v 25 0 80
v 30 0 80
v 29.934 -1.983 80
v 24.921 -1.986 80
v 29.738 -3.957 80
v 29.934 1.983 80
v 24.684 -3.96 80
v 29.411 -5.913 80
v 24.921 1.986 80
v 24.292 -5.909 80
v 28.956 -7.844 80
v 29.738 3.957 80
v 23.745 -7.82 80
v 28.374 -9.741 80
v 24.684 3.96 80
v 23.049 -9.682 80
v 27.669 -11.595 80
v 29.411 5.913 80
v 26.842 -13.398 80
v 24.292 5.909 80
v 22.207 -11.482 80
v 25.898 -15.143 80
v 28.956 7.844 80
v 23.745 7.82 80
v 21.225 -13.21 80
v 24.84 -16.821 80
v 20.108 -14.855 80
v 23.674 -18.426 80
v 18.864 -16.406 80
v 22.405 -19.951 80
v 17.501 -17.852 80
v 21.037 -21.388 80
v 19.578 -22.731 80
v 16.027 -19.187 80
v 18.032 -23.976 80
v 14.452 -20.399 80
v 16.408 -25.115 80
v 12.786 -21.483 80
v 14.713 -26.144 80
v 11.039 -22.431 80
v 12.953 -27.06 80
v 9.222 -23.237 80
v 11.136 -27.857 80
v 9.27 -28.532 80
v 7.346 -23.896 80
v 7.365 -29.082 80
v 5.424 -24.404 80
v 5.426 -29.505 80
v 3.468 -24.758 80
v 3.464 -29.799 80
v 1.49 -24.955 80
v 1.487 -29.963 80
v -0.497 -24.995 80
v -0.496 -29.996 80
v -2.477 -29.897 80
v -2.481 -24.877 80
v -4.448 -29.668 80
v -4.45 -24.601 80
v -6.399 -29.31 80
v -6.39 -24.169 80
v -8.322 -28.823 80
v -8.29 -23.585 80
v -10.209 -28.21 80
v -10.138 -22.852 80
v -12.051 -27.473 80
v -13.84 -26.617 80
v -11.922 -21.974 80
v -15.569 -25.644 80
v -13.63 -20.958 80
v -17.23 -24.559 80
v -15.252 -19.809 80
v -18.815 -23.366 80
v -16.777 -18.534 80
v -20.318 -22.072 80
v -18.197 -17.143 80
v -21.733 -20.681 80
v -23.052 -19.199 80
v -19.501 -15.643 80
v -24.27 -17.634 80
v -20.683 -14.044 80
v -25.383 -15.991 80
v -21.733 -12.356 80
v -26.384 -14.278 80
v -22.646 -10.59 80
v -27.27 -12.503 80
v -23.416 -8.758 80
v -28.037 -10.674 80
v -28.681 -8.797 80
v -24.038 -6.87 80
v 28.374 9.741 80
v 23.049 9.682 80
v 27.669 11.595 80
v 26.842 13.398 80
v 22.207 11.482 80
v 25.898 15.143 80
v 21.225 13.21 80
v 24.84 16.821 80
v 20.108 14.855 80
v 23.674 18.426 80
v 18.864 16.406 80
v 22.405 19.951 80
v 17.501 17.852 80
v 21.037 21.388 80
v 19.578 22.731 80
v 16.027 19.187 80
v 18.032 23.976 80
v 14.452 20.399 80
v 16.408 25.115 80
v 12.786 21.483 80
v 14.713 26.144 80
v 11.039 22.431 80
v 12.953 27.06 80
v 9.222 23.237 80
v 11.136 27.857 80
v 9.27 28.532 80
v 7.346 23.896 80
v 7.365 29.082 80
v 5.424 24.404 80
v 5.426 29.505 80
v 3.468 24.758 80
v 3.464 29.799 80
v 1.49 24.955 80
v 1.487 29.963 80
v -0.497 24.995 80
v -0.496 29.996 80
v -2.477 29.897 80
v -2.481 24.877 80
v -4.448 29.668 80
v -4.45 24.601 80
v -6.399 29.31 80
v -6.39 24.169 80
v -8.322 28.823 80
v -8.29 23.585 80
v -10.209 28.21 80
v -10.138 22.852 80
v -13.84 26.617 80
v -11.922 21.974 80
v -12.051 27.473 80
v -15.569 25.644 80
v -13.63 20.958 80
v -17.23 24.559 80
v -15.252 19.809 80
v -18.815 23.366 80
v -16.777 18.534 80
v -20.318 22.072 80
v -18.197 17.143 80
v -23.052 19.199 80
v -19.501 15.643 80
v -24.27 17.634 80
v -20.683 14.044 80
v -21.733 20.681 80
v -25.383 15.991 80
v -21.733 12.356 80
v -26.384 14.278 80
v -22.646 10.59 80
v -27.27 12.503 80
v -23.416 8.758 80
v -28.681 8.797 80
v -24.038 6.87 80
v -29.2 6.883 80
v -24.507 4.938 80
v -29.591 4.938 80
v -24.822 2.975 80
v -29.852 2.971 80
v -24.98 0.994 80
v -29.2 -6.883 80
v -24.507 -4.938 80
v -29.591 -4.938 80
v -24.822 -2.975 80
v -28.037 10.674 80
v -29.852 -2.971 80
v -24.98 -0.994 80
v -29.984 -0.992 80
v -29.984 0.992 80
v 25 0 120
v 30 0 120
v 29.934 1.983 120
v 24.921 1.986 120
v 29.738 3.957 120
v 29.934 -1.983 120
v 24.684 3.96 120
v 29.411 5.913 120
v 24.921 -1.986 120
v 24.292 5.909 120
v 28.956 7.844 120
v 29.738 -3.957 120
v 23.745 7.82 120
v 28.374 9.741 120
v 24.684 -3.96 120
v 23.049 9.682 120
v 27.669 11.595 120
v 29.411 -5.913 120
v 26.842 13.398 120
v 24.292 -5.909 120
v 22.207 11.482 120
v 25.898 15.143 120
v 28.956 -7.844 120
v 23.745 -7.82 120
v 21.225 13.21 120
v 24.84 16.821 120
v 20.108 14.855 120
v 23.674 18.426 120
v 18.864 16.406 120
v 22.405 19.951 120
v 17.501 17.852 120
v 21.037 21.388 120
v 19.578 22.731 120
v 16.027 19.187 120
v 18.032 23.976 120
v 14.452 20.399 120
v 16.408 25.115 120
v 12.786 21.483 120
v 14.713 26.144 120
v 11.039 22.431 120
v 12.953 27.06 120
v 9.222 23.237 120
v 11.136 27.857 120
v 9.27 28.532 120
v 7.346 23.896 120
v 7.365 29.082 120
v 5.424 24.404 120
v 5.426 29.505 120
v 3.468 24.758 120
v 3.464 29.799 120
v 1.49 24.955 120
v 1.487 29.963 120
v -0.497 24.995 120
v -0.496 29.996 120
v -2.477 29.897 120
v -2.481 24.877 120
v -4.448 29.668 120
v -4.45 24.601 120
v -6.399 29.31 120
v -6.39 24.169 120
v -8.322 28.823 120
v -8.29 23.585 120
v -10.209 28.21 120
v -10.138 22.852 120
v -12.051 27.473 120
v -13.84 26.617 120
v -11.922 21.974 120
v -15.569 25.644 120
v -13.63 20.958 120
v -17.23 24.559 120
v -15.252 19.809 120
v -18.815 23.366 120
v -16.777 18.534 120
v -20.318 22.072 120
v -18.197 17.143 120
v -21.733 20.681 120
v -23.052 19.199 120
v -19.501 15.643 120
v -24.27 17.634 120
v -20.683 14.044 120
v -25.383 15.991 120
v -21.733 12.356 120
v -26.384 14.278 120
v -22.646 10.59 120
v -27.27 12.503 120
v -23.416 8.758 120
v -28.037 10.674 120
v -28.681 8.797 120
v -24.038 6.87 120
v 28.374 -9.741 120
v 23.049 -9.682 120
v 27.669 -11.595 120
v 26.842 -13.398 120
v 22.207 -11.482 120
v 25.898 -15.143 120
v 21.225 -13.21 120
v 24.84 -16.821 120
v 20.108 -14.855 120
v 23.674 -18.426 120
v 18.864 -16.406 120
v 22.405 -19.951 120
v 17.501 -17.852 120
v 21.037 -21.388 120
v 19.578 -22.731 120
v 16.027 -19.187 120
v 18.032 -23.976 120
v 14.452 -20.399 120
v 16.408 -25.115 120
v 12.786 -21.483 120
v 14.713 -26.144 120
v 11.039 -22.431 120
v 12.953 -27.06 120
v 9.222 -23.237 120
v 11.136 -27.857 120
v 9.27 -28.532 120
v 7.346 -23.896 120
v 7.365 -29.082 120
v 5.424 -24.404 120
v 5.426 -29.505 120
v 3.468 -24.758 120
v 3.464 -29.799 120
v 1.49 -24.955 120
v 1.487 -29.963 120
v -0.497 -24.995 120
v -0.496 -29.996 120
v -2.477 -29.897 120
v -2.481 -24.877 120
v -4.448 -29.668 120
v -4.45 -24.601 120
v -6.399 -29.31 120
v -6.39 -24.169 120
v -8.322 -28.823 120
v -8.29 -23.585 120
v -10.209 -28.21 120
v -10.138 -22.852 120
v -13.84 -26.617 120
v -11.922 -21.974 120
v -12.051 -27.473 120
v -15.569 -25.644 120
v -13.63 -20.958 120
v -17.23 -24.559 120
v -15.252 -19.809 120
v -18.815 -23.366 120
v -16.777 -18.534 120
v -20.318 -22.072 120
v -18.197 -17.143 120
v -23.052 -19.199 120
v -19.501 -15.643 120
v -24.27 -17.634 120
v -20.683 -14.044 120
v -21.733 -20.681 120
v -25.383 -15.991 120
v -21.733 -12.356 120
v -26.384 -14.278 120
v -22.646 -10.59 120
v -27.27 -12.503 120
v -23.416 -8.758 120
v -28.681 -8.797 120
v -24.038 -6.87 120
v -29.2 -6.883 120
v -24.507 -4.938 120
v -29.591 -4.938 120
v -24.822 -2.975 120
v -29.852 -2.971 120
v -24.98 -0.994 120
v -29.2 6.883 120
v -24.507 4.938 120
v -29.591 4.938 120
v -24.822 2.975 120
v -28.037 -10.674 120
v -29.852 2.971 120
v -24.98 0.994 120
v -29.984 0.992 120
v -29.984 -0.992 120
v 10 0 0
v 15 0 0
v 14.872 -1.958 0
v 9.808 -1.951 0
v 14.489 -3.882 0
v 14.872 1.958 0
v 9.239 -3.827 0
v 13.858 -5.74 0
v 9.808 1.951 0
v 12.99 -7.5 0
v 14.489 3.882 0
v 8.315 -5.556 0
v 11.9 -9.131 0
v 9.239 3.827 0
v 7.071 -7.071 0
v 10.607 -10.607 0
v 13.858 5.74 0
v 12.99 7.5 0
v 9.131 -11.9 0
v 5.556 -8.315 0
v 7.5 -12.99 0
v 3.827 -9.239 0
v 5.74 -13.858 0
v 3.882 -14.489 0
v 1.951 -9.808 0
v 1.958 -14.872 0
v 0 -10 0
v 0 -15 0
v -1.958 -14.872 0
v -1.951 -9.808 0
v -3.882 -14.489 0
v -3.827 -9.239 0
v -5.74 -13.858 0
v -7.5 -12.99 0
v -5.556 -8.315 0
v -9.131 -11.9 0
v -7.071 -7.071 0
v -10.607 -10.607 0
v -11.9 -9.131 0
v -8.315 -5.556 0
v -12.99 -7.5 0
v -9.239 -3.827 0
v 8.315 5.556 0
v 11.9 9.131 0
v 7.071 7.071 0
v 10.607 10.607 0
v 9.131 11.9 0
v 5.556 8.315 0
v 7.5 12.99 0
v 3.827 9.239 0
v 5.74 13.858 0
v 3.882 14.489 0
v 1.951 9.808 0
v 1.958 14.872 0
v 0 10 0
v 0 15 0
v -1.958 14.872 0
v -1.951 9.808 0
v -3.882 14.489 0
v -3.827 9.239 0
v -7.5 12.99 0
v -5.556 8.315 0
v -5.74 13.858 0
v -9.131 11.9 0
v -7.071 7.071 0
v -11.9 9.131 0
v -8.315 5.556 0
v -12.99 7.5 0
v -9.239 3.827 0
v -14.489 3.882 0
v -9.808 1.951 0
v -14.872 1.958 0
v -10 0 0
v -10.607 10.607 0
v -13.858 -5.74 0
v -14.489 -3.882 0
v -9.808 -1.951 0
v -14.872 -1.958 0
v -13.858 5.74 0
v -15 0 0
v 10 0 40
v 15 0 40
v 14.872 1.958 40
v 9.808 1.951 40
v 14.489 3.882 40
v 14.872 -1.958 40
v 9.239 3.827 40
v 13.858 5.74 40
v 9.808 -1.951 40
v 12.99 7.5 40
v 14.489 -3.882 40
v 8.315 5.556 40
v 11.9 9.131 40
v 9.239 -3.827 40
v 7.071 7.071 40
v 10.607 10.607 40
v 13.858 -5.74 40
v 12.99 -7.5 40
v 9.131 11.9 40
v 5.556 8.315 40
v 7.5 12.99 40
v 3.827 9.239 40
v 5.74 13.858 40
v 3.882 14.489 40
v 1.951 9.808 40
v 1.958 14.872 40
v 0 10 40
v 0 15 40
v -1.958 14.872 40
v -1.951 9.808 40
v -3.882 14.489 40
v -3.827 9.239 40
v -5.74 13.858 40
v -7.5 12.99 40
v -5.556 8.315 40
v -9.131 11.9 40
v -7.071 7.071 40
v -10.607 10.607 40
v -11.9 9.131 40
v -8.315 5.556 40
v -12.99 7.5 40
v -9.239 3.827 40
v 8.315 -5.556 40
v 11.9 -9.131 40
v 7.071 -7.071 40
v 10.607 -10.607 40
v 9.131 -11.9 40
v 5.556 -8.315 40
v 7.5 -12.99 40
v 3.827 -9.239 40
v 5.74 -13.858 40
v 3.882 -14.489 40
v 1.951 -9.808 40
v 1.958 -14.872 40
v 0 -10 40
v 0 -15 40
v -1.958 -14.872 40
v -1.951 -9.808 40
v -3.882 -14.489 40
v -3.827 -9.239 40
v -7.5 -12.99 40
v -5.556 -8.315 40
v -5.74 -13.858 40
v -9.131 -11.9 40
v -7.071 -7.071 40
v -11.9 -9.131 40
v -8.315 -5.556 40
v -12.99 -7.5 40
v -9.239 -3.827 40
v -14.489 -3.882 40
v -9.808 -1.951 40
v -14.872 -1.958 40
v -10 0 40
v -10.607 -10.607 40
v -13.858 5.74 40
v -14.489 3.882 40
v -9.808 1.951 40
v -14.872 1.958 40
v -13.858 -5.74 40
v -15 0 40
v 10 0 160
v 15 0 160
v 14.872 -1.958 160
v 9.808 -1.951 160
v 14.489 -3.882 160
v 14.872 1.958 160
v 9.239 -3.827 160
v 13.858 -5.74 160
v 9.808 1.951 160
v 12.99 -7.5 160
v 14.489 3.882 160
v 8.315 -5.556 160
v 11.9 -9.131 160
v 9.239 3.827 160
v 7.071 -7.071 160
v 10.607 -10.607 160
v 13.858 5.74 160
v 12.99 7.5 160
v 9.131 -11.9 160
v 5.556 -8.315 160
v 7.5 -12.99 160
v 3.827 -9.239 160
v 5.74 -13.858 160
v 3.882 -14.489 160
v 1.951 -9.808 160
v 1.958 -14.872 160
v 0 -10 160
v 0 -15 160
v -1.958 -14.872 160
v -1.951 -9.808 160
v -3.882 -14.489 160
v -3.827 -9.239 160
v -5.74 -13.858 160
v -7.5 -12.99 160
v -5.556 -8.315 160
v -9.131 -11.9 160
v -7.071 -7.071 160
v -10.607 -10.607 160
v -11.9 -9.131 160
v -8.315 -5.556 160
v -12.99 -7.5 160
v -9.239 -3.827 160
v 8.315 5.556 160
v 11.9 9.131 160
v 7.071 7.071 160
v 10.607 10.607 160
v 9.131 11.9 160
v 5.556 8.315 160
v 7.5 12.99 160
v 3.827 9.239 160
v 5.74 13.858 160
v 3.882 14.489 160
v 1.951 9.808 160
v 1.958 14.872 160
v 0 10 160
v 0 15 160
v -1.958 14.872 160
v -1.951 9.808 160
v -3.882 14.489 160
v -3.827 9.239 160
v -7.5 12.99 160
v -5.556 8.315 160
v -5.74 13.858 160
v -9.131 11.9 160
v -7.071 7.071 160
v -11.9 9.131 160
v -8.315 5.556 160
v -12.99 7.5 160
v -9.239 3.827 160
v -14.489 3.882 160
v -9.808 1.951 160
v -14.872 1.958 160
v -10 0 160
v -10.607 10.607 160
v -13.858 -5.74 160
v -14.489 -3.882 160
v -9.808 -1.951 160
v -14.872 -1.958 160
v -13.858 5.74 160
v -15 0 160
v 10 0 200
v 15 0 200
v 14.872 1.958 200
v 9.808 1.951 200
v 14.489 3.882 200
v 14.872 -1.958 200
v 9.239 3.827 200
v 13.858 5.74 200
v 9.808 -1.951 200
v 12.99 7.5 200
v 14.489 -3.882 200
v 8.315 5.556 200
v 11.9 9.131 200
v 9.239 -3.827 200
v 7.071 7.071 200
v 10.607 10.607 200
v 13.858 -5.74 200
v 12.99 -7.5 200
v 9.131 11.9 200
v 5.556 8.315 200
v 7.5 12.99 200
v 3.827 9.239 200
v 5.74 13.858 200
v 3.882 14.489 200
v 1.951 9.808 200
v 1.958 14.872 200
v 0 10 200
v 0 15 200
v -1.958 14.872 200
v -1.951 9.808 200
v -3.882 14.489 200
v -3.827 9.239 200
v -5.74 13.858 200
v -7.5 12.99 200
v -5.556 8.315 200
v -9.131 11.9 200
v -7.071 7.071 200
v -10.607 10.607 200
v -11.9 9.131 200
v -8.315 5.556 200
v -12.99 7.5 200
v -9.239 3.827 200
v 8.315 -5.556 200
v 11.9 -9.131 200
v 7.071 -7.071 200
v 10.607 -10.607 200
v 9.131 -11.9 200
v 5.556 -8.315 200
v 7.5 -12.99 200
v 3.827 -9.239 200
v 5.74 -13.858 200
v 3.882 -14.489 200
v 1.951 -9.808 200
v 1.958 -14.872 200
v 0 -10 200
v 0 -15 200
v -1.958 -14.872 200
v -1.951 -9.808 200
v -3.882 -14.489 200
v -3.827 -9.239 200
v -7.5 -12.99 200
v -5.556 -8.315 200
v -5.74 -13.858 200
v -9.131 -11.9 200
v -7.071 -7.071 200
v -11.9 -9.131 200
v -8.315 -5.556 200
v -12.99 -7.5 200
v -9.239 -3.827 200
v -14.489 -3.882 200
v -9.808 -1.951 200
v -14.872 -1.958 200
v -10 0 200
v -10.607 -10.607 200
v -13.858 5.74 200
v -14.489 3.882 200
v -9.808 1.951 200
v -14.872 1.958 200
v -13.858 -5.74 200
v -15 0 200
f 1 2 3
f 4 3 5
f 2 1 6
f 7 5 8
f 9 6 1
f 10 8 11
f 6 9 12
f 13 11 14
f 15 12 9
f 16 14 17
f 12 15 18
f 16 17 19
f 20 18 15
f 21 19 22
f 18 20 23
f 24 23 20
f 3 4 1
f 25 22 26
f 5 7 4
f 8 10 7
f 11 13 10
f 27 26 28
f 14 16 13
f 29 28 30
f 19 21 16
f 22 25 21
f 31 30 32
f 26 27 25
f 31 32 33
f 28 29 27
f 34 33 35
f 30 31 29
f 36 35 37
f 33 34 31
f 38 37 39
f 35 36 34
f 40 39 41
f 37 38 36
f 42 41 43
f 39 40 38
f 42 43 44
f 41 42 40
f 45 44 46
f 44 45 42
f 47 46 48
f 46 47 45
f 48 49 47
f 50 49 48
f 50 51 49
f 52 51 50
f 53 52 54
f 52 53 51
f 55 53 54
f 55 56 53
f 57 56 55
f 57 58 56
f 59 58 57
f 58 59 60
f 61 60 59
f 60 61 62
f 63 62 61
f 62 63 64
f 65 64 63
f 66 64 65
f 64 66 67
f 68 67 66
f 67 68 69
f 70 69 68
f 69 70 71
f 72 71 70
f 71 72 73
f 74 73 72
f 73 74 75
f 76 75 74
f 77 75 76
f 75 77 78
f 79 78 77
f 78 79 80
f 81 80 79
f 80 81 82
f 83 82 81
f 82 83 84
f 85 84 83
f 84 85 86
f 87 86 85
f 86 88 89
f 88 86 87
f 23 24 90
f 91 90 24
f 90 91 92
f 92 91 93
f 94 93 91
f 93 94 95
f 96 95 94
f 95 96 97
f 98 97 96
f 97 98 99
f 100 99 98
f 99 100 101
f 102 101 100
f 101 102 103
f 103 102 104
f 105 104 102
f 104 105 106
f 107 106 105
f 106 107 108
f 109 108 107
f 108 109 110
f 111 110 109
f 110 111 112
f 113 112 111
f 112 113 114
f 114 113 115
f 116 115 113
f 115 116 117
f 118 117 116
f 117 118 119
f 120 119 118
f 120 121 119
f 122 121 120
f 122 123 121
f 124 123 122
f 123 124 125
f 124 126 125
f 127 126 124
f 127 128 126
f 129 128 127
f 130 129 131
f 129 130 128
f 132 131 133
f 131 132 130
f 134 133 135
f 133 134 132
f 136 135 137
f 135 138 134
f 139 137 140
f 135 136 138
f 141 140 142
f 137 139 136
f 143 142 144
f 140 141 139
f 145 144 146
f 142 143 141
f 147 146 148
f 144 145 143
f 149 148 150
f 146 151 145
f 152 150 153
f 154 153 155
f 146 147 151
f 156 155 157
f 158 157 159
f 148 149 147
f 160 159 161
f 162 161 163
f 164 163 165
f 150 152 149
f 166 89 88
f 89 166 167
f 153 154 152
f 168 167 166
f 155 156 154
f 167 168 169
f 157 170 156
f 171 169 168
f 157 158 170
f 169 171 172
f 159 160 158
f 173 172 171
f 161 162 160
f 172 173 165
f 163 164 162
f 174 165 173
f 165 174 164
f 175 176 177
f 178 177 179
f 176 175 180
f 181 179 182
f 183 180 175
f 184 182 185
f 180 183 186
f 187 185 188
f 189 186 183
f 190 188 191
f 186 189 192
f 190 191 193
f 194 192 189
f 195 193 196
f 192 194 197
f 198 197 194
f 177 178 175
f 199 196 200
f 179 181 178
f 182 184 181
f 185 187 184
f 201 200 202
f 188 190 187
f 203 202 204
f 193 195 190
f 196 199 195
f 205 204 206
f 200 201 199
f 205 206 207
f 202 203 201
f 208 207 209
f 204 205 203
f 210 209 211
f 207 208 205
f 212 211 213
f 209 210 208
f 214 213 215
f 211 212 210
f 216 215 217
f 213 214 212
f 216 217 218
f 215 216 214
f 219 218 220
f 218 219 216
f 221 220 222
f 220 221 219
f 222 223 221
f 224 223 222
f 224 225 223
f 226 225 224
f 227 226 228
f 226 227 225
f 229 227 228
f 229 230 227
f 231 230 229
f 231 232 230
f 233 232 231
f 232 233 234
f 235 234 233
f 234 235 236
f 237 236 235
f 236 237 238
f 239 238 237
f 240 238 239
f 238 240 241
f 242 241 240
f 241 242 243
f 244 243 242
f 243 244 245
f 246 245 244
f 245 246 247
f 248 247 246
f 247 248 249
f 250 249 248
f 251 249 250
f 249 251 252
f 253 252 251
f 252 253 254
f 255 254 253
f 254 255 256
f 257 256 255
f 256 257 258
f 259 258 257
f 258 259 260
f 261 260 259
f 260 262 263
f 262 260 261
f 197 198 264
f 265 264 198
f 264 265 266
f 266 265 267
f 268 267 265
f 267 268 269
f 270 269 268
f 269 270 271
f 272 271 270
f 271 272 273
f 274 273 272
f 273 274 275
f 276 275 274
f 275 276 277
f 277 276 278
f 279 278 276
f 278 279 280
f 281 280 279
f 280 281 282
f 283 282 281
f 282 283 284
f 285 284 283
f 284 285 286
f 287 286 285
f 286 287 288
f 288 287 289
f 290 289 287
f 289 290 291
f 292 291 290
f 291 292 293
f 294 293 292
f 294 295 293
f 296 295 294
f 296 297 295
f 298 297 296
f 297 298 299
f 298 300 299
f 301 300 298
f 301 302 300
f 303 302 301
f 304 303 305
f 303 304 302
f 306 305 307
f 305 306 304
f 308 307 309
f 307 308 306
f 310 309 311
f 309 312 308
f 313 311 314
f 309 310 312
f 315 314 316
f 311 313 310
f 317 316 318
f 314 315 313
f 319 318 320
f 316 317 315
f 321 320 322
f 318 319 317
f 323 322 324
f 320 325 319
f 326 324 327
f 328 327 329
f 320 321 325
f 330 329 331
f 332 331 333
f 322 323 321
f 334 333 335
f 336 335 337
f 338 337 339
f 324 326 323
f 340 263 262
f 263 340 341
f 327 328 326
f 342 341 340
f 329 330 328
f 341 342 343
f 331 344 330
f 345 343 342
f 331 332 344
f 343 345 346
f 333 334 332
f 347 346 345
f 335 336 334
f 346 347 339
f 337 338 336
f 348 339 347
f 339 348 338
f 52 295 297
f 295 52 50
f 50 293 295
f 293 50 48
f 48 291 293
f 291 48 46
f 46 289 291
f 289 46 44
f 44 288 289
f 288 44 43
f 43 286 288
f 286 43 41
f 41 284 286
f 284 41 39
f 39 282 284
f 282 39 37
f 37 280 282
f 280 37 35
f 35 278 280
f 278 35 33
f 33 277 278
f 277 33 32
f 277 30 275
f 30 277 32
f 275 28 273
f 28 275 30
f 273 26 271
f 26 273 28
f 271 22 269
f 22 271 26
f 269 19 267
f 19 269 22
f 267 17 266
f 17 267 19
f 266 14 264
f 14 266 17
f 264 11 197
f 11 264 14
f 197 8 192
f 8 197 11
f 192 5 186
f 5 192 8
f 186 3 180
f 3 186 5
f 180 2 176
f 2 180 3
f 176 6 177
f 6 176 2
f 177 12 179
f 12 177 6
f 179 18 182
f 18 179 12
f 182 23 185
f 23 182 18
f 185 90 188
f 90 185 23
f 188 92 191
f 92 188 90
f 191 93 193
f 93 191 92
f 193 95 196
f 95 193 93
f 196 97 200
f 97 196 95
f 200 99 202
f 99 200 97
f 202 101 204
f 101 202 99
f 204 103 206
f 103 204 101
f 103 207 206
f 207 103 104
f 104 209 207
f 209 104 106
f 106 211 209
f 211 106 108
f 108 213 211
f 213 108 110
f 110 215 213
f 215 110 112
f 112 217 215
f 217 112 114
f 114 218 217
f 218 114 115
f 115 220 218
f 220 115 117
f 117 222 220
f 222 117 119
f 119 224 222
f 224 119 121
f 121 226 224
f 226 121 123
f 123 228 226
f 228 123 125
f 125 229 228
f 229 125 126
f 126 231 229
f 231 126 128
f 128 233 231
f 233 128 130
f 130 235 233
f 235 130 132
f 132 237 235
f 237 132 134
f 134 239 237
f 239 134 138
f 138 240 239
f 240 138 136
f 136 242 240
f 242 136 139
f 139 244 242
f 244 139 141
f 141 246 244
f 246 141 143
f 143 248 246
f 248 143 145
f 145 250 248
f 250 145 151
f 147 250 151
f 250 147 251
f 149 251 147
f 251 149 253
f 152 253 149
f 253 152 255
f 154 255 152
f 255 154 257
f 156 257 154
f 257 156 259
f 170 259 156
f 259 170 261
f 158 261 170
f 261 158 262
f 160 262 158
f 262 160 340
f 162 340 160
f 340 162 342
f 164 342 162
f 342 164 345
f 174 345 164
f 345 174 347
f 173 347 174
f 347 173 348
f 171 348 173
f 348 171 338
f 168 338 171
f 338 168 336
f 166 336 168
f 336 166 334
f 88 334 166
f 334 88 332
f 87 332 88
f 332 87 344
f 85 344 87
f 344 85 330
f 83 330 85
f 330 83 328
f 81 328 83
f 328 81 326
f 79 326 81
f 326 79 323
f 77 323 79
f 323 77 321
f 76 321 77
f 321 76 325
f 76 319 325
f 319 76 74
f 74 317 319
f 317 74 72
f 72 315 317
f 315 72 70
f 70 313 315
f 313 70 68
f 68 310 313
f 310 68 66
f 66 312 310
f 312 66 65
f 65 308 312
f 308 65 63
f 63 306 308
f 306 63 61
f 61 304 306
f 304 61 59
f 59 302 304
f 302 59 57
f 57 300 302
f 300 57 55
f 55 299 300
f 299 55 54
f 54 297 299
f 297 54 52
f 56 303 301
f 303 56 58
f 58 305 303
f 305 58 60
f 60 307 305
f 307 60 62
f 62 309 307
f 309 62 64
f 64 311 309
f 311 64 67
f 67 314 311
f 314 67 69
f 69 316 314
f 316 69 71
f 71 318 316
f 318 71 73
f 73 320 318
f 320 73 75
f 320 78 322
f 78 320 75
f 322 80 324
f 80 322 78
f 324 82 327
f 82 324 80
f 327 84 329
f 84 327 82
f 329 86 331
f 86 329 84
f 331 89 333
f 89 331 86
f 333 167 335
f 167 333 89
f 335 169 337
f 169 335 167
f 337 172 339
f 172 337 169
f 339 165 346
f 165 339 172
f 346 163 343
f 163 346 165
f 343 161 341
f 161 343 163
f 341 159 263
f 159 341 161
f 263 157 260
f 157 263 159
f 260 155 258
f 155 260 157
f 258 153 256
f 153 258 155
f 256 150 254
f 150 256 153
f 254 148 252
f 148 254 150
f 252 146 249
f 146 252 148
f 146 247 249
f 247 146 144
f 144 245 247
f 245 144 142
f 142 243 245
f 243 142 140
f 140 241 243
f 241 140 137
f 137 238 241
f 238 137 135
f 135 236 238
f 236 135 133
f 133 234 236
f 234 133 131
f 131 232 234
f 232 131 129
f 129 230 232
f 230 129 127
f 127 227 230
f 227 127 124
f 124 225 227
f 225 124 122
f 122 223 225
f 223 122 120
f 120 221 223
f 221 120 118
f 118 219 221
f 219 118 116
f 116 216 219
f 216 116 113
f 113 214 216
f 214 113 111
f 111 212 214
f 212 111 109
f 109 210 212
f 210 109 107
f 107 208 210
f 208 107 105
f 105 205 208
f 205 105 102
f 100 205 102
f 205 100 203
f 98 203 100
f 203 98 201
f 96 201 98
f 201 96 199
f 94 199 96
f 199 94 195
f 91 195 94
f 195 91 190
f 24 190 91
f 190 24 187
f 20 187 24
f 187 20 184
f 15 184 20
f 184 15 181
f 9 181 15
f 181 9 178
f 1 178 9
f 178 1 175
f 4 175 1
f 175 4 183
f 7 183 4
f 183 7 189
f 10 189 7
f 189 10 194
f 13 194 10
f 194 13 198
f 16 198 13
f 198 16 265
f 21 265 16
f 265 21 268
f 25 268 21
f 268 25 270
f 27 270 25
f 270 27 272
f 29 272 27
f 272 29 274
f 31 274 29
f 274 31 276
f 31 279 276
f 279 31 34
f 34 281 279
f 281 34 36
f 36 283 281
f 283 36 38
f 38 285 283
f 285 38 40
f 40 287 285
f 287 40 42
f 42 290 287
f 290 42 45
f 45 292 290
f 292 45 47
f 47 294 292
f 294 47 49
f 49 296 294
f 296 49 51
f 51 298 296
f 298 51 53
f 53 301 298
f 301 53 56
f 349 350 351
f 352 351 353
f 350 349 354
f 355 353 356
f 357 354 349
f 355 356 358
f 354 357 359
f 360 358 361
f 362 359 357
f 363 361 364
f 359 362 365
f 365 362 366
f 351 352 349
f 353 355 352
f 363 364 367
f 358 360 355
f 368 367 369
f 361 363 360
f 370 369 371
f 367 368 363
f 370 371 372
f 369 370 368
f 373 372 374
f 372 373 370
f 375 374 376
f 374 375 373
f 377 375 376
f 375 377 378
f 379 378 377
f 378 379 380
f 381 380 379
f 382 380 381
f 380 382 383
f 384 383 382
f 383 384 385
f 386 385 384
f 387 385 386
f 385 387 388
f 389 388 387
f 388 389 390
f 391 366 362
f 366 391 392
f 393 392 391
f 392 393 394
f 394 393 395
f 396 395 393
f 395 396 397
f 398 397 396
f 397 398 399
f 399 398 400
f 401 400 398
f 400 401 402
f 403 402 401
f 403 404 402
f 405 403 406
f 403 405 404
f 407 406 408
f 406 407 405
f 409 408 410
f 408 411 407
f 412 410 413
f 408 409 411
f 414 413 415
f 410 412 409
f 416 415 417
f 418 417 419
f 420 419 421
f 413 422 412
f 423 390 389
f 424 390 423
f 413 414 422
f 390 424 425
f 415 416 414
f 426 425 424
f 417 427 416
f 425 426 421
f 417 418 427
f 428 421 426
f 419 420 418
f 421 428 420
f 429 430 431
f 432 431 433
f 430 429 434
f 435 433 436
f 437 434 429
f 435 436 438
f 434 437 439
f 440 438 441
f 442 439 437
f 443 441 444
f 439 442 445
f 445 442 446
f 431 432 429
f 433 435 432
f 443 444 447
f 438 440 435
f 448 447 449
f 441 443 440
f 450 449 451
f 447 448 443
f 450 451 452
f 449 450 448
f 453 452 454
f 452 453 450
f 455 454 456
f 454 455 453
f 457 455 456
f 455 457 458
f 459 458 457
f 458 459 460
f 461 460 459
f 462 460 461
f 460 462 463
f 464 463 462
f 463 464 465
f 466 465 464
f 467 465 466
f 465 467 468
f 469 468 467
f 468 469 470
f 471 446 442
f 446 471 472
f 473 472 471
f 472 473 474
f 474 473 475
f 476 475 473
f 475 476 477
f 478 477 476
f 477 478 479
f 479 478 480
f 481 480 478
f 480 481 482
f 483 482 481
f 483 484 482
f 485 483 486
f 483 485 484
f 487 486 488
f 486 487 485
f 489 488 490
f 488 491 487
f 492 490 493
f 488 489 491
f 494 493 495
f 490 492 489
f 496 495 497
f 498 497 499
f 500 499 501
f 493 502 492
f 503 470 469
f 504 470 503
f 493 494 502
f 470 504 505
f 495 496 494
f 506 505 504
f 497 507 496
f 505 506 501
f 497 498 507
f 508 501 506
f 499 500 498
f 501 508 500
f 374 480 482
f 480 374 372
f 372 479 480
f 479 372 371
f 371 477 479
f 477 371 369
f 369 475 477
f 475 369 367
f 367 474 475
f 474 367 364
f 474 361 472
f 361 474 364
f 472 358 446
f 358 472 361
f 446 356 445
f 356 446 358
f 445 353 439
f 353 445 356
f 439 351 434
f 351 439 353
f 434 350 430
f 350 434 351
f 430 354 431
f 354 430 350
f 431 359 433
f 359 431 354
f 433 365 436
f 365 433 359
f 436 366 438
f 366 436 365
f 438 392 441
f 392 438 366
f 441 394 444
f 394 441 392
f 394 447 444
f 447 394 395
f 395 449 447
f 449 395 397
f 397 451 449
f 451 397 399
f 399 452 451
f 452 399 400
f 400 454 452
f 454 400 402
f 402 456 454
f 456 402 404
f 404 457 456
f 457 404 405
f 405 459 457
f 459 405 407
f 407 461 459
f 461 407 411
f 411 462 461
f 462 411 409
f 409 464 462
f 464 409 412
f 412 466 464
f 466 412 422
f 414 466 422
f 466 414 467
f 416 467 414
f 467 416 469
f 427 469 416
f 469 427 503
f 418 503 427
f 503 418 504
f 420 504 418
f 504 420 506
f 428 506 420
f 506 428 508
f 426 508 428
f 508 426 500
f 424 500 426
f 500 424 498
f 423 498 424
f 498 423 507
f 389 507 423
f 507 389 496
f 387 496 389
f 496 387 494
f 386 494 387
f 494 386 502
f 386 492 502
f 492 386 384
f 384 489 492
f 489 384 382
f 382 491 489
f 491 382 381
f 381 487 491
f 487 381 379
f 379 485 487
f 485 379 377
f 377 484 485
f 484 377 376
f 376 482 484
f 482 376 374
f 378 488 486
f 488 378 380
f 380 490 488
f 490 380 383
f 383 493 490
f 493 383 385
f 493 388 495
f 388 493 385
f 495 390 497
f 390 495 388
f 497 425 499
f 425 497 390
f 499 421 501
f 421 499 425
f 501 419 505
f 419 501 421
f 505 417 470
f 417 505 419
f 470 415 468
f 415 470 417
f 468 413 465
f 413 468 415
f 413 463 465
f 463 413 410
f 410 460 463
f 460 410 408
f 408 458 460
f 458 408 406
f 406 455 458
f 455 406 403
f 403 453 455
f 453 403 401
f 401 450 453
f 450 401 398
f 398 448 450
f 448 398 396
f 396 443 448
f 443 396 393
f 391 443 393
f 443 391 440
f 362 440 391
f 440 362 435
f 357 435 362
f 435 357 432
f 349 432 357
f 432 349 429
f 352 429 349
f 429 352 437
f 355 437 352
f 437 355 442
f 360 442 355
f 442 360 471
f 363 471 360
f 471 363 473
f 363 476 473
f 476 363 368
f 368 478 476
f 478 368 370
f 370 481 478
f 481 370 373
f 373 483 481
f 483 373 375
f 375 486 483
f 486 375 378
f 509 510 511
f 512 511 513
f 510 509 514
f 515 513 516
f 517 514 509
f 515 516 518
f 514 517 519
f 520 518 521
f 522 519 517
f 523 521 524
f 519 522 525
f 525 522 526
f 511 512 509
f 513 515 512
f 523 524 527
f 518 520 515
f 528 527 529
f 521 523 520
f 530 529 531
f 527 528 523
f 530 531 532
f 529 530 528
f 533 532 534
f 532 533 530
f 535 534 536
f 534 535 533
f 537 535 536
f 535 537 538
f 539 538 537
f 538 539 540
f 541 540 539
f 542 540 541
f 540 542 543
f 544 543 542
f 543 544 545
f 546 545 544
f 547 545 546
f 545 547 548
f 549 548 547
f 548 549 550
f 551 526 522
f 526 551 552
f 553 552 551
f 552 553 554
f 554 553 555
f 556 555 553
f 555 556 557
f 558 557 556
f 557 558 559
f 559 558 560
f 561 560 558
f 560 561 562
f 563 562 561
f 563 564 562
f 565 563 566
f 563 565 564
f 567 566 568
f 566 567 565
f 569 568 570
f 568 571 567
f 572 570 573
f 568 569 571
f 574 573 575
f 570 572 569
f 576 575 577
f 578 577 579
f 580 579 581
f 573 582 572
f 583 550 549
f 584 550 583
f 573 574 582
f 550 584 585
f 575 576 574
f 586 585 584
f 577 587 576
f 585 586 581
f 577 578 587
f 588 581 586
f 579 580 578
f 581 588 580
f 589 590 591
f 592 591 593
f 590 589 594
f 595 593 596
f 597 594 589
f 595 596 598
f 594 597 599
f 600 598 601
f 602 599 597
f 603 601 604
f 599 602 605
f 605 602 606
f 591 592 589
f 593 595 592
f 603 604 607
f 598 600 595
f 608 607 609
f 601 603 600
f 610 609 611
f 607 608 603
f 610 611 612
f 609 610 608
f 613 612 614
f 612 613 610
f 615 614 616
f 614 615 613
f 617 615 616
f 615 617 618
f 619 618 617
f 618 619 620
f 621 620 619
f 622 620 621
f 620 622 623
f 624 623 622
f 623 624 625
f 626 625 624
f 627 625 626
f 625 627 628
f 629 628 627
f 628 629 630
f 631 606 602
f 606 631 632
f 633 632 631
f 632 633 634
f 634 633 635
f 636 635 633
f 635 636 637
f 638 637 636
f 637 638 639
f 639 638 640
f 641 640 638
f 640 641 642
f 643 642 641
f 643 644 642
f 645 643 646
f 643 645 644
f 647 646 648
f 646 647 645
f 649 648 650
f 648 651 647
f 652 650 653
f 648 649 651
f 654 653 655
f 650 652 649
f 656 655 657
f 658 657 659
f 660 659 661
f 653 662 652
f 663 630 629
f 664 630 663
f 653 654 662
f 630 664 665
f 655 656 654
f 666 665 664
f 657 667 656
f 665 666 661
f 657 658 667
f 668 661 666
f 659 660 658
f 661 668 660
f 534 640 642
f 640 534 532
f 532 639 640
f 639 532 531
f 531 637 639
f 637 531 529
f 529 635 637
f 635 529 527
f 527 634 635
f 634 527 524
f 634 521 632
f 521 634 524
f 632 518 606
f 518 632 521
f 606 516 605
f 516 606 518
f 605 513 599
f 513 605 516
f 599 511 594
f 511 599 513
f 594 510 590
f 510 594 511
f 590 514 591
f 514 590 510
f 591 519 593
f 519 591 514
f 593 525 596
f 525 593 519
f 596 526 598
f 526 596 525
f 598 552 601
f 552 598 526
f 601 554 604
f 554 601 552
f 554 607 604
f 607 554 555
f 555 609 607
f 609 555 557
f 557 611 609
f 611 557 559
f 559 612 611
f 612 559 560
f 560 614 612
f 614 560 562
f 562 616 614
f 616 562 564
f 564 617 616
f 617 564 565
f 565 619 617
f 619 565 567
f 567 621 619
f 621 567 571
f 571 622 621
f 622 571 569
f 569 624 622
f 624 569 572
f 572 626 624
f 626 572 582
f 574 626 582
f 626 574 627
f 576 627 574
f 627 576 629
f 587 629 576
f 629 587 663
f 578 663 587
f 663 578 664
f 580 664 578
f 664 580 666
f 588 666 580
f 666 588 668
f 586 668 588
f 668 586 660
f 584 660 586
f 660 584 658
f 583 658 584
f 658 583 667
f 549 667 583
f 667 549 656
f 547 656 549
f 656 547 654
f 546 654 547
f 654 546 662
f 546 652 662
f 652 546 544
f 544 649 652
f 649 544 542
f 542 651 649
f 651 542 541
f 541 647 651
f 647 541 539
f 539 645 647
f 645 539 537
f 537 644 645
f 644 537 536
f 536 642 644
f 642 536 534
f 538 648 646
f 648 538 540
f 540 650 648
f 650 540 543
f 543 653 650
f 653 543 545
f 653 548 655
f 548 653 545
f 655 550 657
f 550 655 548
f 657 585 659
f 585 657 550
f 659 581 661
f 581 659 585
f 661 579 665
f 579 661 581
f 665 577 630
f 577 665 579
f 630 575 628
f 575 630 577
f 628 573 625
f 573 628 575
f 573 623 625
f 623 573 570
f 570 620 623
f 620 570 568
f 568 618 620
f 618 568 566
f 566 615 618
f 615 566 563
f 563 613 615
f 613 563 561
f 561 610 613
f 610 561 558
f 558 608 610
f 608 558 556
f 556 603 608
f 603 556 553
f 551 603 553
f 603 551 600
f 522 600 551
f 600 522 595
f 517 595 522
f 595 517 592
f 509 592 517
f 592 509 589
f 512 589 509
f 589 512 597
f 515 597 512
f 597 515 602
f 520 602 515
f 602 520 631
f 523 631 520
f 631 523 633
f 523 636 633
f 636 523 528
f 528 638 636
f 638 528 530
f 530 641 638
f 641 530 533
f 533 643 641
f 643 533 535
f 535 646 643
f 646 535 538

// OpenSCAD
// Generated by Parametrix
ca_myPartU_faceSide_000 = [ [ 30.0000, 80.0000 ],[ 30.0000, 120.0000 ],[ 25.0000, 120.0000 ],[ 25.0000, 80.0000 ],[ 30.0000, 80.0000 ] ];
cb_myPartU_faceSide_000 = [  0, 1, 2, 3, 4 ];
ca_myPartU_faceSide_001 = [ [ 15.0000, 0.0000 ],[ 15.0000, 40.0000 ],[ 10.0000, 40.0000 ],[ 10.0000, 0.0000 ],[ 15.0000, 0.0000 ] ];
cb_myPartU_faceSide_001 = [  5, 6, 7, 8, 9 ];
ca_myPartU_faceSide_002 = [ [ 15.0000, 160.0000 ],[ 15.0000, 200.0000 ],[ 10.0000, 200.0000 ],[ 10.0000, 160.0000 ],[ 15.0000, 160.0000 ] ];
cb_myPartU_faceSide_002 = [  10, 11, 12, 13, 14 ];
a_myPartU_faceSide = concat(ca_myPartU_faceSide_000, ca_myPartU_faceSide_001, ca_myPartU_faceSide_002);
b_myPartU_faceSide = [cb_myPartU_faceSide_000, cb_myPartU_faceSide_001, cb_myPartU_faceSide_002];
ca_myPartU_faceSection_000 = [ [ 30.0000, 0.0000 ],[ 29.9344, 1.9827 ],[ 29.7379, 3.9568 ],[ 29.4114, 5.9135 ],[ 28.9563, 7.8444 ],[ 28.3745, 9.7410 ],[ 27.6687, 11.5950 ],[ 26.8419, 13.3983 ],[ 25.8977, 15.1430 ],[ 24.8403, 16.8215 ],[ 23.6742, 18.4264 ],[ 22.4046, 19.9507 ],[ 21.0371, 21.3879 ],[ 19.5776, 22.7314 ],[ 18.0324, 23.9756 ],[ 16.4084, 25.1150 ],[ 14.7127, 26.1445 ],[ 12.9526, 27.0597 ],[ 11.1359, 27.8566 ],[ 9.2705, 28.5317 ],[ 7.3646, 29.0820 ],[ 5.4264, 29.5052 ],[ 3.4645, 29.7993 ],[ 1.4875, 29.9631 ],[ -0.4960, 29.9959 ],[ -2.4774, 29.8975 ],[ -4.4479, 29.6684 ],[ -6.3990, 29.3096 ],[ -8.3221, 28.8226 ],[ -10.2088, 28.2096 ],[ -12.0509, 27.4732 ],[ -13.8402, 26.6167 ],[ -15.5691, 25.6438 ],[ -17.2299, 24.5587 ],[ -18.8153, 23.3663 ],[ -20.3184, 22.0717 ],[ -21.7328, 20.6806 ],[ -23.0520, 19.1991 ],[ -24.2705, 17.6336 ],[ -25.3829, 15.9910 ],[ -26.3842, 14.2784 ],[ -27.2702, 12.5035 ],[ -28.0369, 10.6738 ],[ -28.6811, 8.7975 ],[ -29.1998, 6.8827 ],[ -29.5908, 4.9378 ],[ -29.8525, 2.9714 ],[ -29.9836, 0.9919 ],[ -29.9836, -0.9919 ],[ -29.8525, -2.9714 ],[ -29.5908, -4.9378 ],[ -29.1998, -6.8827 ],[ -28.6811, -8.7975 ],[ -28.0369, -10.6738 ],[ -27.2702, -12.5035 ],[ -26.3842, -14.2784 ],[ -25.3829, -15.9910 ],[ -24.2705, -17.6336 ],[ -23.0520, -19.1991 ],[ -21.7328, -20.6806 ],[ -20.3184, -22.0717 ],[ -18.8153, -23.3663 ],[ -17.2299, -24.5587 ],[ -15.5691, -25.6438 ],[ -13.8402, -26.6167 ],[ -12.0509, -27.4732 ],[ -10.2088, -28.2096 ],[ -8.3221, -28.8226 ],[ -6.3990, -29.3096 ],[ -4.4479, -29.6684 ],[ -2.4774, -29.8975 ],[ -0.4960, -29.9959 ],[ 1.4875, -29.9631 ],[ 3.4645, -29.7993 ],[ 5.4264, -29.5052 ],[ 7.3646, -29.0820 ],[ 9.2705, -28.5317 ],[ 11.1359, -27.8566 ],[ 12.9526, -27.0597 ],[ 14.7127, -26.1445 ],[ 16.4084, -25.1150 ],[ 18.0324, -23.9756 ],[ 19.5776, -22.7314 ],[ 21.0371, -21.3879 ],[ 22.4046, -19.9507 ],[ 23.6742, -18.4264 ],[ 24.8403, -16.8215 ],[ 25.8977, -15.1430 ],[ 26.8419, -13.3983 ],[ 27.6687, -11.5950 ],[ 28.3745, -9.7410 ],[ 28.9563, -7.8444 ],[ 29.4114, -5.9135 ],[ 29.7379, -3.9568 ],[ 29.9344, -1.9827 ],[ 30.0000, 0.0000 ] ];
cb_myPartU_faceSection_000 = [  0, 1, 2, 3, 4, 5, 6, 7, 8, 9, 10, 11, 12, 13, 14, 15, 16, 17, 18, 19, 20, 21, 22, 23, 24, 25, 26, 27, 28, 29, 30, 31, 32, 33, 34, 35, 36, 37, 38, 39, 40, 41, 42, 43, 44, 45, 46, 47, 48, 49, 50, 51, 52, 53, 54, 55, 56, 57, 58, 59, 60, 61, 62, 63, 64, 65, 66, 67, 68, 69, 70, 71, 72, 73, 74, 75, 76, 77, 78, 79, 80, 81, 82, 83, 84, 85, 86, 87, 88, 89, 90, 91, 92, 93, 94, 95 ];
ca_myPartU_faceSection_001 = [ [ 25.0000, 0.0000 ],[ 24.9210, 1.9863 ],[ 24.6844, 3.9600 ],[ 24.2917, 5.9086 ],[ 23.7455, 7.8199 ],[ 23.0491, 9.6818 ],[ 22.2071, 11.4824 ],[ 21.2246, 13.2105 ],[ 20.1079, 14.8550 ],[ 18.8641, 16.4056 ],[ 17.5011, 17.8525 ],[ 16.0273, 19.1866 ],[ 14.4523, 20.3993 ],[ 12.7859, 21.4830 ],[ 11.0386, 22.4310 ],[ 9.2216, 23.2371 ],[ 7.3463, 23.8963 ],[ 5.4245, 24.4044 ],[ 3.4684, 24.7582 ],[ 1.4904, 24.9555 ],[ -0.4971, 24.9951 ],[ -2.4813, 24.8766 ],[ -4.4499, 24.6008 ],[ -6.3904, 24.1695 ],[ -8.2905, 23.5853 ],[ -10.1381, 22.8521 ],[ -11.9217, 21.9744 ],[ -13.6299, 20.9577 ],[ -15.2519, 19.8086 ],[ -16.7775, 18.5342 ],[ -18.1970, 17.1426 ],[ -19.5014, 15.6427 ],[ -20.6826, 14.0439 ],[ -21.7330, 12.3562 ],[ -22.6460, 10.5905 ],[ -23.4158, 8.7578 ],[ -24.0376, 6.8697 ],[ -24.5074, 4.9382 ],[ -24.8223, 2.9755 ],[ -24.9802, 0.9939 ],[ -24.9802, -0.9939 ],[ -24.8223, -2.9755 ],[ -24.5074, -4.9382 ],[ -24.0376, -6.8697 ],[ -23.4158, -8.7578 ],[ -22.6460, -10.5905 ],[ -21.7330, -12.3562 ],[ -20.6826, -14.0439 ],[ -19.5014, -15.6427 ],[ -18.1970, -17.1426 ],[ -16.7775, -18.5342 ],[ -15.2519, -19.8086 ],[ -13.6299, -20.9577 ],[ -11.9217, -21.9744 ],[ -10.1381, -22.8521 ],[ -8.2905, -23.5853 ],[ -6.3904, -24.1695 ],[ -4.4499, -24.6008 ],[ -2.4813, -24.8766 ],[ -0.4971, -24.9951 ],[ 1.4904, -24.9555 ],[ 3.4684, -24.7582 ],[ 5.4245, -24.4044 ],[ 7.3463, -23.8963 ],[ 9.2216, -23.2371 ],[ 11.0386, -22.4310 ],[ 12.7859, -21.4830 ],[ 14.4523, -20.3993 ],[ 16.0273, -19.1866 ],[ 17.5011, -17.8525 ],[ 18.8641, -16.4056 ],[ 20.1079, -14.8550 ],[ 21.2246, -13.2105 ],[ 22.2071, -11.4824 ],[ 23.0491, -9.6818 ],[ 23.7455, -7.8199 ],[ 24.2917, -5.9086 ],[ 24.6844, -3.9600 ],[ 24.9210, -1.9863 ],[ 25.0000, 0.0000 ] ];
cb_myPartU_faceSection_001 = [  96, 97, 98, 99, 100, 101, 102, 103, 104, 105, 106, 107, 108, 109, 110, 111, 112, 113, 114, 115, 116, 117, 118, 119, 120, 121, 122, 123, 124, 125, 126, 127, 128, 129, 130, 131, 132, 133, 134, 135, 136, 137, 138, 139, 140, 141, 142, 143, 144, 145, 146, 147, 148, 149, 150, 151, 152, 153, 154, 155, 156, 157, 158, 159, 160, 161, 162, 163, 164, 165, 166, 167, 168, 169, 170, 171, 172, 173, 174, 175 ];
ca_myPartU_faceSection_002 = [ [ 15.0000, 0.0000 ],[ 14.8717, 1.9579 ],[ 14.4889, 3.8823 ],[ 13.8582, 5.7403 ],[ 12.9904, 7.5000 ],[ 11.9003, 9.1314 ],[ 10.6066, 10.6066 ],[ 9.1314, 11.9003 ],[ 7.5000, 12.9904 ],[ 5.7403, 13.8582 ],[ 3.8823, 14.4889 ],[ 1.9579, 14.8717 ],[ 0.0000, 15.0000 ],[ -1.9579, 14.8717 ],[ -3.8823, 14.4889 ],[ -5.7403, 13.8582 ],[ -7.5000, 12.9904 ],[ -9.1314, 11.9003 ],[ -10.6066, 10.6066 ],[ -11.9003, 9.1314 ],[ -12.9904, 7.5000 ],[ -13.8582, 5.7403 ],[ -14.4889, 3.8823 ],[ -14.8717, 1.9579 ],[ -15.0000, 0.0000 ],[ -14.8717, -1.9579 ],[ -14.4889, -3.8823 ],[ -13.8582, -5.7403 ],[ -12.9904, -7.5000 ],[ -11.9003, -9.1314 ],[ -10.6066, -10.6066 ],[ -9.1314, -11.9003 ],[ -7.5000, -12.9904 ],[ -5.7403, -13.8582 ],[ -3.8823, -14.4889 ],[ -1.9579, -14.8717 ],[ -0.0000, -15.0000 ],[ 1.9579, -14.8717 ],[ 3.8823, -14.4889 ],[ 5.7403, -13.8582 ],[ 7.5000, -12.9904 ],[ 9.1314, -11.9003 ],[ 10.6066, -10.6066 ],[ 11.9003, -9.1314 ],[ 12.9904, -7.5000 ],[ 13.8582, -5.7403 ],[ 14.4889, -3.8823 ],[ 14.8717, -1.9579 ],[ 15.0000, 0.0000 ] ];
cb_myPartU_faceSection_002 = [  176, 177, 178, 179, 180, 181, 182, 183, 184, 185, 186, 187, 188, 189, 190, 191, 192, 193, 194, 195, 196, 197, 198, 199, 200, 201, 202, 203, 204, 205, 206, 207, 208, 209, 210, 211, 212, 213, 214, 215, 216, 217, 218, 219, 220, 221, 222, 223, 224 ];
ca_myPartU_faceSection_003 = [ [ 10.0000, 0.0000 ],[ 9.8079, 1.9509 ],[ 9.2388, 3.8268 ],[ 8.3147, 5.5557 ],[ 7.0711, 7.0711 ],[ 5.5557, 8.3147 ],[ 3.8268, 9.2388 ],[ 1.9509, 9.8079 ],[ 0.0000, 10.0000 ],[ -1.9509, 9.8079 ],[ -3.8268, 9.2388 ],[ -5.5557, 8.3147 ],[ -7.0711, 7.0711 ],[ -8.3147, 5.5557 ],[ -9.2388, 3.8268 ],[ -9.8079, 1.9509 ],[ -10.0000, 0.0000 ],[ -9.8079, -1.9509 ],[ -9.2388, -3.8268 ],[ -8.3147, -5.5557 ],[ -7.0711, -7.0711 ],[ -5.5557, -8.3147 ],[ -3.8268, -9.2388 ],[ -1.9509, -9.8079 ],[ -0.0000, -10.0000 ],[ 1.9509, -9.8079 ],[ 3.8268, -9.2388 ],[ 5.5557, -8.3147 ],[ 7.0711, -7.0711 ],[ 8.3147, -5.5557 ],[ 9.2388, -3.8268 ],[ 9.8079, -1.9509 ],[ 10.0000, 0.0000 ] ];
cb_myPartU_faceSection_003 = [  225, 226, 227, 228, 229, 230, 231, 232, 233, 234, 235, 236, 237, 238, 239, 240, 241, 242, 243, 244, 245, 246, 247, 248, 249, 250, 251, 252, 253, 254, 255, 256, 257 ];
a_myPartU_faceSection = concat(ca_myPartU_faceSection_000, ca_myPartU_faceSection_001, ca_myPartU_faceSection_002, ca_myPartU_faceSection_003);
b_myPartU_faceSection = [cb_myPartU_faceSection_000, cb_myPartU_faceSection_001, cb_myPartU_faceSection_002, cb_myPartU_faceSection_003];
ca_myPartAref1_faceSection_000 = [ [ 30.0000, 0.0000 ],[ 29.9344, 1.9827 ],[ 29.7379, 3.9568 ],[ 29.4114, 5.9135 ],[ 28.9563, 7.8444 ],[ 28.3745, 9.7410 ],[ 27.6687, 11.5950 ],[ 26.8419, 13.3983 ],[ 25.8977, 15.1430 ],[ 24.8403, 16.8215 ],[ 23.6742, 18.4264 ],[ 22.4046, 19.9507 ],[ 21.0371, 21.3879 ],[ 19.5776, 22.7314 ],[ 18.0324, 23.9756 ],[ 16.4084, 25.1150 ],[ 14.7127, 26.1445 ],[ 12.9526, 27.0597 ],[ 11.1359, 27.8566 ],[ 9.2705, 28.5317 ],[ 7.3646, 29.0820 ],[ 5.4264, 29.5052 ],[ 3.4645, 29.7993 ],[ 1.4875, 29.9631 ],[ -0.4960, 29.9959 ],[ -2.4774, 29.8975 ],[ -4.4479, 29.6684 ],[ -6.3990, 29.3096 ],[ -8.3221, 28.8226 ],[ -10.2088, 28.2096 ],[ -12.0509, 27.4732 ],[ -13.8402, 26.6167 ],[ -15.5691, 25.6438 ],[ -17.2299, 24.5587 ],[ -18.8153, 23.3663 ],[ -20.3184, 22.0717 ],[ -21.7328, 20.6806 ],[ -23.0520, 19.1991 ],[ -24.2705, 17.6336 ],[ -25.3829, 15.9910 ],[ -26.3842, 14.2784 ],[ -27.2702, 12.5035 ],[ -28.0369, 10.6738 ],[ -28.6811, 8.7975 ],[ -29.1998, 6.8827 ],[ -29.5908, 4.9378 ],[ -29.8525, 2.9714 ],[ -29.9836, 0.9919 ],[ -29.9836, -0.9919 ],[ -29.8525, -2.9714 ],[ -29.5908, -4.9378 ],[ -29.1998, -6.8827 ],[ -28.6811, -8.7975 ],[ -28.0369, -10.6738 ],[ -27.2702, -12.5035 ],[ -26.3842, -14.2784 ],[ -25.3829, -15.9910 ],[ -24.2705, -17.6336 ],[ -23.0520, -19.1991 ],[ -21.7328, -20.6806 ],[ -20.3184, -22.0717 ],[ -18.8153, -23.3663 ],[ -17.2299, -24.5587 ],[ -15.5691, -25.6438 ],[ -13.8402, -26.6167 ],[ -12.0509, -27.4732 ],[ -10.2088, -28.2096 ],[ -8.3221, -28.8226 ],[ -6.3990, -29.3096 ],[ -4.4479, -29.6684 ],[ -2.4774, -29.8975 ],[ -0.4960, -29.9959 ],[ 1.4875, -29.9631 ],[ 3.4645, -29.7993 ],[ 5.4264, -29.5052 ],[ 7.3646, -29.0820 ],[ 9.2705, -28.5317 ],[ 11.1359, -27.8566 ],[ 12.9526, -27.0597 ],[ 14.7127, -26.1445 ],[ 16.4084, -25.1150 ],[ 18.0324, -23.9756 ],[ 19.5776, -22.7314 ],[ 21.0371, -21.3879 ],[ 22.4046, -19.9507 ],[ 23.6742, -18.4264 ],[ 24.8403, -16.8215 ],[ 25.8977, -15.1430 ],[ 26.8419, -13.3983 ],[ 27.6687, -11.5950 ],[ 28.3745, -9.7410 ],[ 28.9563, -7.8444 ],[ 29.4114, -5.9135 ],[ 29.7379, -3.9568 ],[ 29.9344, -1.9827 ],[ 30.0000, 0.0000 ] ];
cb_myPartAref1_faceSection_000 = [  0, 1, 2, 3, 4, 5, 6, 7, 8, 9, 10, 11, 12, 13, 14, 15, 16, 17, 18, 19, 20, 21, 22, 23, 24, 25, 26, 27, 28, 29, 30, 31, 32, 33, 34, 35, 36, 37, 38, 39, 40, 41, 42, 43, 44, 45, 46, 47, 48, 49, 50, 51, 52, 53, 54, 55, 56, 57, 58, 59, 60, 61, 62, 63, 64, 65, 66, 67, 68, 69, 70, 71, 72, 73, 74, 75, 76, 77, 78, 79, 80, 81, 82, 83, 84, 85, 86, 87, 88, 89, 90, 91, 92, 93, 94, 95 ];
ca_myPartAref1_faceSection_001 = [ [ 25.0000, 0.0000 ],[ 24.9210, 1.9863 ],[ 24.6844, 3.9600 ],[ 24.2917, 5.9086 ],[ 23.7455, 7.8199 ],[ 23.0491, 9.6818 ],[ 22.2071, 11.4824 ],[ 21.2246, 13.2105 ],[ 20.1079, 14.8550 ],[ 18.8641, 16.4056 ],[ 17.5011, 17.8525 ],[ 16.0273, 19.1866 ],[ 14.4523, 20.3993 ],[ 12.7859, 21.4830 ],[ 11.0386, 22.4310 ],[ 9.2216, 23.2371 ],[ 7.3463, 23.8963 ],[ 5.4245, 24.4044 ],[ 3.4684, 24.7582 ],[ 1.4904, 24.9555 ],[ -0.4971, 24.9951 ],[ -2.4813, 24.8766 ],[ -4.4499, 24.6008 ],[ -6.3904, 24.1695 ],[ -8.2905, 23.5853 ],[ -10.1381, 22.8521 ],[ -11.9217, 21.9744 ],[ -13.6299, 20.9577 ],[ -15.2519, 19.8086 ],[ -16.7775, 18.5342 ],[ -18.1970, 17.1426 ],[ -19.5014, 15.6427 ],[ -20.6826, 14.0439 ],[ -21.7330, 12.3562 ],[ -22.6460, 10.5905 ],[ -23.4158, 8.7578 ],[ -24.0376, 6.8697 ],[ -24.5074, 4.9382 ],[ -24.8223, 2.9755 ],[ -24.9802, 0.9939 ],[ -24.9802, -0.9939 ],[ -24.8223, -2.9755 ],[ -24.5074, -4.9382 ],[ -24.0376, -6.8697 ],[ -23.4158, -8.7578 ],[ -22.6460, -10.5905 ],[ -21.7330, -12.3562 ],[ -20.6826, -14.0439 ],[ -19.5014, -15.6427 ],[ -18.1970, -17.1426 ],[ -16.7775, -18.5342 ],[ -15.2519, -19.8086 ],[ -13.6299, -20.9577 ],[ -11.9217, -21.9744 ],[ -10.1381, -22.8521 ],[ -8.2905, -23.5853 ],[ -6.3904, -24.1695 ],[ -4.4499, -24.6008 ],[ -2.4813, -24.8766 ],[ -0.4971, -24.9951 ],[ 1.4904, -24.9555 ],[ 3.4684, -24.7582 ],[ 5.4245, -24.4044 ],[ 7.3463, -23.8963 ],[ 9.2216, -23.2371 ],[ 11.0386, -22.4310 ],[ 12.7859, -21.4830 ],[ 14.4523, -20.3993 ],[ 16.0273, -19.1866 ],[ 17.5011, -17.8525 ],[ 18.8641, -16.4056 ],[ 20.1079, -14.8550 ],[ 21.2246, -13.2105 ],[ 22.2071, -11.4824 ],[ 23.0491, -9.6818 ],[ 23.7455, -7.8199 ],[ 24.2917, -5.9086 ],[ 24.6844, -3.9600 ],[ 24.9210, -1.9863 ],[ 25.0000, 0.0000 ] ];
cb_myPartAref1_faceSection_001 = [  96, 97, 98, 99, 100, 101, 102, 103, 104, 105, 106, 107, 108, 109, 110, 111, 112, 113, 114, 115, 116, 117, 118, 119, 120, 121, 122, 123, 124, 125, 126, 127, 128, 129, 130, 131, 132, 133, 134, 135, 136, 137, 138, 139, 140, 141, 142, 143, 144, 145, 146, 147, 148, 149, 150, 151, 152, 153, 154, 155, 156, 157, 158, 159, 160, 161, 162, 163, 164, 165, 166, 167, 168, 169, 170, 171, 172, 173, 174, 175 ];
a_myPartAref1_faceSection = concat(ca_myPartAref1_faceSection_000, ca_myPartAref1_faceSection_001);
b_myPartAref1_faceSection = [cb_myPartAref1_faceSection_000, cb_myPartAref1_faceSection_001];
ca_myPartAref1_faceSide_000 = [ [ 30.0000, 0.0000 ],[ 30.0000, 40.0000 ],[ 25.0000, 40.0000 ],[ 25.0000, 0.0000 ],[ 30.0000, 0.0000 ] ];
cb_myPartAref1_faceSide_000 = [  0, 1, 2, 3, 4 ];
a_myPartAref1_faceSide = concat(ca_myPartAref1_faceSide_000);
b_myPartAref1_faceSide = [cb_myPartAref1_faceSide_000];

module subpax_myPartAref1 () {
	translate( [ 0, 0, 0 ])
		rotate( [ 0, 0, 0 ])
			   linear_extrude(height = 40) polygon(a_myPartAref1_faceSection, b_myPartAref1_faceSection);
}

module pax_myPartAref1 () {
	subpax_myPartAref1();
}
ca_myPartAref2_faceSection_000 = [ [ 15.0000, 0.0000 ],[ 14.8717, 1.9579 ],[ 14.4889, 3.8823 ],[ 13.8582, 5.7403 ],[ 12.9904, 7.5000 ],[ 11.9003, 9.1314 ],[ 10.6066, 10.6066 ],[ 9.1314, 11.9003 ],[ 7.5000, 12.9904 ],[ 5.7403, 13.8582 ],[ 3.8823, 14.4889 ],[ 1.9579, 14.8717 ],[ 0.0000, 15.0000 ],[ -1.9579, 14.8717 ],[ -3.8823, 14.4889 ],[ -5.7403, 13.8582 ],[ -7.5000, 12.9904 ],[ -9.1314, 11.9003 ],[ -10.6066, 10.6066 ],[ -11.9003, 9.1314 ],[ -12.9904, 7.5000 ],[ -13.8582, 5.7403 ],[ -14.4889, 3.8823 ],[ -14.8717, 1.9579 ],[ -15.0000, 0.0000 ],[ -14.8717, -1.9579 ],[ -14.4889, -3.8823 ],[ -13.8582, -5.7403 ],[ -12.9904, -7.5000 ],[ -11.9003, -9.1314 ],[ -10.6066, -10.6066 ],[ -9.1314, -11.9003 ],[ -7.5000, -12.9904 ],[ -5.7403, -13.8582 ],[ -3.8823, -14.4889 ],[ -1.9579, -14.8717 ],[ -0.0000, -15.0000 ],[ 1.9579, -14.8717 ],[ 3.8823, -14.4889 ],[ 5.7403, -13.8582 ],[ 7.5000, -12.9904 ],[ 9.1314, -11.9003 ],[ 10.6066, -10.6066 ],[ 11.9003, -9.1314 ],[ 12.9904, -7.5000 ],[ 13.8582, -5.7403 ],[ 14.4889, -3.8823 ],[ 14.8717, -1.9579 ],[ 15.0000, 0.0000 ] ];
cb_myPartAref2_faceSection_000 = [  0, 1, 2, 3, 4, 5, 6, 7, 8, 9, 10, 11, 12, 13, 14, 15, 16, 17, 18, 19, 20, 21, 22, 23, 24, 25, 26, 27, 28, 29, 30, 31, 32, 33, 34, 35, 36, 37, 38, 39, 40, 41, 42, 43, 44, 45, 46, 47, 48 ];
ca_myPartAref2_faceSection_001 = [ [ 10.0000, 0.0000 ],[ 9.8079, 1.9509 ],[ 9.2388, 3.8268 ],[ 8.3147, 5.5557 ],[ 7.0711, 7.0711 ],[ 5.5557, 8.3147 ],[ 3.8268, 9.2388 ],[ 1.9509, 9.8079 ],[ 0.0000, 10.0000 ],[ -1.9509, 9.8079 ],[ -3.8268, 9.2388 ],[ -5.5557, 8.3147 ],[ -7.0711, 7.0711 ],[ -8.3147, 5.5557 ],[ -9.2388, 3.8268 ],[ -9.8079, 1.9509 ],[ -10.0000, 0.0000 ],[ -9.8079, -1.9509 ],[ -9.2388, -3.8268 ],[ -8.3147, -5.5557 ],[ -7.0711, -7.0711 ],[ -5.5557, -8.3147 ],[ -3.8268, -9.2388 ],[ -1.9509, -9.8079 ],[ -0.0000, -10.0000 ],[ 1.9509, -9.8079 ],[ 3.8268, -9.2388 ],[ 5.5557, -8.3147 ],[ 7.0711, -7.0711 ],[ 8.3147, -5.5557 ],[ 9.2388, -3.8268 ],[ 9.8079, -1.9509 ],[ 10.0000, 0.0000 ] ];
cb_myPartAref2_faceSection_001 = [  49, 50, 51, 52, 53, 54, 55, 56, 57, 58, 59, 60, 61, 62, 63, 64, 65, 66, 67, 68, 69, 70, 71, 72, 73, 74, 75, 76, 77, 78, 79, 80, 81 ];
a_myPartAref2_faceSection = concat(ca_myPartAref2_faceSection_000, ca_myPartAref2_faceSection_001);
b_myPartAref2_faceSection = [cb_myPartAref2_faceSection_000, cb_myPartAref2_faceSection_001];
ca_myPartAref2_faceSide_000 = [ [ 15.0000, 0.0000 ],[ 15.0000, 40.0000 ],[ 10.0000, 40.0000 ],[ 10.0000, 0.0000 ],[ 15.0000, 0.0000 ] ];
cb_myPartAref2_faceSide_000 = [  0, 1, 2, 3, 4 ];
a_myPartAref2_faceSide = concat(ca_myPartAref2_faceSide_000);
b_myPartAref2_faceSide = [cb_myPartAref2_faceSide_000];

module subpax_myPartAref2 () {
	translate( [ 0, 0, 0 ])
		rotate( [ 0, 0, 0 ])
			   linear_extrude(height = 40) polygon(a_myPartAref2_faceSection, b_myPartAref2_faceSection);
}

module pax_myPartAref2 () {
	subpax_myPartAref2();
}

module inpax_myPartU_A1 () {
	translate( [ 0, 0, 80 ])
		rotate( [ 0, 0, 0 ])
			   pax_myPartAref1();
}

module inpax_myPartU_A21 () {
	translate( [ 0, 0, 0 ])
		rotate( [ 0, 0, 0 ])
			   pax_myPartAref2();
}

module inpax_myPartU_A22 () {
	translate( [ 0, 0, 160 ])
		rotate( [ 0, 0, 0 ])
			   pax_myPartAref2();
}

module pax_myPartU () {
	union () {
		inpax_myPartU_A1();
inpax_myPartU_A21();
inpax_myPartU_A22();
	}
}

pax_myPartU();
